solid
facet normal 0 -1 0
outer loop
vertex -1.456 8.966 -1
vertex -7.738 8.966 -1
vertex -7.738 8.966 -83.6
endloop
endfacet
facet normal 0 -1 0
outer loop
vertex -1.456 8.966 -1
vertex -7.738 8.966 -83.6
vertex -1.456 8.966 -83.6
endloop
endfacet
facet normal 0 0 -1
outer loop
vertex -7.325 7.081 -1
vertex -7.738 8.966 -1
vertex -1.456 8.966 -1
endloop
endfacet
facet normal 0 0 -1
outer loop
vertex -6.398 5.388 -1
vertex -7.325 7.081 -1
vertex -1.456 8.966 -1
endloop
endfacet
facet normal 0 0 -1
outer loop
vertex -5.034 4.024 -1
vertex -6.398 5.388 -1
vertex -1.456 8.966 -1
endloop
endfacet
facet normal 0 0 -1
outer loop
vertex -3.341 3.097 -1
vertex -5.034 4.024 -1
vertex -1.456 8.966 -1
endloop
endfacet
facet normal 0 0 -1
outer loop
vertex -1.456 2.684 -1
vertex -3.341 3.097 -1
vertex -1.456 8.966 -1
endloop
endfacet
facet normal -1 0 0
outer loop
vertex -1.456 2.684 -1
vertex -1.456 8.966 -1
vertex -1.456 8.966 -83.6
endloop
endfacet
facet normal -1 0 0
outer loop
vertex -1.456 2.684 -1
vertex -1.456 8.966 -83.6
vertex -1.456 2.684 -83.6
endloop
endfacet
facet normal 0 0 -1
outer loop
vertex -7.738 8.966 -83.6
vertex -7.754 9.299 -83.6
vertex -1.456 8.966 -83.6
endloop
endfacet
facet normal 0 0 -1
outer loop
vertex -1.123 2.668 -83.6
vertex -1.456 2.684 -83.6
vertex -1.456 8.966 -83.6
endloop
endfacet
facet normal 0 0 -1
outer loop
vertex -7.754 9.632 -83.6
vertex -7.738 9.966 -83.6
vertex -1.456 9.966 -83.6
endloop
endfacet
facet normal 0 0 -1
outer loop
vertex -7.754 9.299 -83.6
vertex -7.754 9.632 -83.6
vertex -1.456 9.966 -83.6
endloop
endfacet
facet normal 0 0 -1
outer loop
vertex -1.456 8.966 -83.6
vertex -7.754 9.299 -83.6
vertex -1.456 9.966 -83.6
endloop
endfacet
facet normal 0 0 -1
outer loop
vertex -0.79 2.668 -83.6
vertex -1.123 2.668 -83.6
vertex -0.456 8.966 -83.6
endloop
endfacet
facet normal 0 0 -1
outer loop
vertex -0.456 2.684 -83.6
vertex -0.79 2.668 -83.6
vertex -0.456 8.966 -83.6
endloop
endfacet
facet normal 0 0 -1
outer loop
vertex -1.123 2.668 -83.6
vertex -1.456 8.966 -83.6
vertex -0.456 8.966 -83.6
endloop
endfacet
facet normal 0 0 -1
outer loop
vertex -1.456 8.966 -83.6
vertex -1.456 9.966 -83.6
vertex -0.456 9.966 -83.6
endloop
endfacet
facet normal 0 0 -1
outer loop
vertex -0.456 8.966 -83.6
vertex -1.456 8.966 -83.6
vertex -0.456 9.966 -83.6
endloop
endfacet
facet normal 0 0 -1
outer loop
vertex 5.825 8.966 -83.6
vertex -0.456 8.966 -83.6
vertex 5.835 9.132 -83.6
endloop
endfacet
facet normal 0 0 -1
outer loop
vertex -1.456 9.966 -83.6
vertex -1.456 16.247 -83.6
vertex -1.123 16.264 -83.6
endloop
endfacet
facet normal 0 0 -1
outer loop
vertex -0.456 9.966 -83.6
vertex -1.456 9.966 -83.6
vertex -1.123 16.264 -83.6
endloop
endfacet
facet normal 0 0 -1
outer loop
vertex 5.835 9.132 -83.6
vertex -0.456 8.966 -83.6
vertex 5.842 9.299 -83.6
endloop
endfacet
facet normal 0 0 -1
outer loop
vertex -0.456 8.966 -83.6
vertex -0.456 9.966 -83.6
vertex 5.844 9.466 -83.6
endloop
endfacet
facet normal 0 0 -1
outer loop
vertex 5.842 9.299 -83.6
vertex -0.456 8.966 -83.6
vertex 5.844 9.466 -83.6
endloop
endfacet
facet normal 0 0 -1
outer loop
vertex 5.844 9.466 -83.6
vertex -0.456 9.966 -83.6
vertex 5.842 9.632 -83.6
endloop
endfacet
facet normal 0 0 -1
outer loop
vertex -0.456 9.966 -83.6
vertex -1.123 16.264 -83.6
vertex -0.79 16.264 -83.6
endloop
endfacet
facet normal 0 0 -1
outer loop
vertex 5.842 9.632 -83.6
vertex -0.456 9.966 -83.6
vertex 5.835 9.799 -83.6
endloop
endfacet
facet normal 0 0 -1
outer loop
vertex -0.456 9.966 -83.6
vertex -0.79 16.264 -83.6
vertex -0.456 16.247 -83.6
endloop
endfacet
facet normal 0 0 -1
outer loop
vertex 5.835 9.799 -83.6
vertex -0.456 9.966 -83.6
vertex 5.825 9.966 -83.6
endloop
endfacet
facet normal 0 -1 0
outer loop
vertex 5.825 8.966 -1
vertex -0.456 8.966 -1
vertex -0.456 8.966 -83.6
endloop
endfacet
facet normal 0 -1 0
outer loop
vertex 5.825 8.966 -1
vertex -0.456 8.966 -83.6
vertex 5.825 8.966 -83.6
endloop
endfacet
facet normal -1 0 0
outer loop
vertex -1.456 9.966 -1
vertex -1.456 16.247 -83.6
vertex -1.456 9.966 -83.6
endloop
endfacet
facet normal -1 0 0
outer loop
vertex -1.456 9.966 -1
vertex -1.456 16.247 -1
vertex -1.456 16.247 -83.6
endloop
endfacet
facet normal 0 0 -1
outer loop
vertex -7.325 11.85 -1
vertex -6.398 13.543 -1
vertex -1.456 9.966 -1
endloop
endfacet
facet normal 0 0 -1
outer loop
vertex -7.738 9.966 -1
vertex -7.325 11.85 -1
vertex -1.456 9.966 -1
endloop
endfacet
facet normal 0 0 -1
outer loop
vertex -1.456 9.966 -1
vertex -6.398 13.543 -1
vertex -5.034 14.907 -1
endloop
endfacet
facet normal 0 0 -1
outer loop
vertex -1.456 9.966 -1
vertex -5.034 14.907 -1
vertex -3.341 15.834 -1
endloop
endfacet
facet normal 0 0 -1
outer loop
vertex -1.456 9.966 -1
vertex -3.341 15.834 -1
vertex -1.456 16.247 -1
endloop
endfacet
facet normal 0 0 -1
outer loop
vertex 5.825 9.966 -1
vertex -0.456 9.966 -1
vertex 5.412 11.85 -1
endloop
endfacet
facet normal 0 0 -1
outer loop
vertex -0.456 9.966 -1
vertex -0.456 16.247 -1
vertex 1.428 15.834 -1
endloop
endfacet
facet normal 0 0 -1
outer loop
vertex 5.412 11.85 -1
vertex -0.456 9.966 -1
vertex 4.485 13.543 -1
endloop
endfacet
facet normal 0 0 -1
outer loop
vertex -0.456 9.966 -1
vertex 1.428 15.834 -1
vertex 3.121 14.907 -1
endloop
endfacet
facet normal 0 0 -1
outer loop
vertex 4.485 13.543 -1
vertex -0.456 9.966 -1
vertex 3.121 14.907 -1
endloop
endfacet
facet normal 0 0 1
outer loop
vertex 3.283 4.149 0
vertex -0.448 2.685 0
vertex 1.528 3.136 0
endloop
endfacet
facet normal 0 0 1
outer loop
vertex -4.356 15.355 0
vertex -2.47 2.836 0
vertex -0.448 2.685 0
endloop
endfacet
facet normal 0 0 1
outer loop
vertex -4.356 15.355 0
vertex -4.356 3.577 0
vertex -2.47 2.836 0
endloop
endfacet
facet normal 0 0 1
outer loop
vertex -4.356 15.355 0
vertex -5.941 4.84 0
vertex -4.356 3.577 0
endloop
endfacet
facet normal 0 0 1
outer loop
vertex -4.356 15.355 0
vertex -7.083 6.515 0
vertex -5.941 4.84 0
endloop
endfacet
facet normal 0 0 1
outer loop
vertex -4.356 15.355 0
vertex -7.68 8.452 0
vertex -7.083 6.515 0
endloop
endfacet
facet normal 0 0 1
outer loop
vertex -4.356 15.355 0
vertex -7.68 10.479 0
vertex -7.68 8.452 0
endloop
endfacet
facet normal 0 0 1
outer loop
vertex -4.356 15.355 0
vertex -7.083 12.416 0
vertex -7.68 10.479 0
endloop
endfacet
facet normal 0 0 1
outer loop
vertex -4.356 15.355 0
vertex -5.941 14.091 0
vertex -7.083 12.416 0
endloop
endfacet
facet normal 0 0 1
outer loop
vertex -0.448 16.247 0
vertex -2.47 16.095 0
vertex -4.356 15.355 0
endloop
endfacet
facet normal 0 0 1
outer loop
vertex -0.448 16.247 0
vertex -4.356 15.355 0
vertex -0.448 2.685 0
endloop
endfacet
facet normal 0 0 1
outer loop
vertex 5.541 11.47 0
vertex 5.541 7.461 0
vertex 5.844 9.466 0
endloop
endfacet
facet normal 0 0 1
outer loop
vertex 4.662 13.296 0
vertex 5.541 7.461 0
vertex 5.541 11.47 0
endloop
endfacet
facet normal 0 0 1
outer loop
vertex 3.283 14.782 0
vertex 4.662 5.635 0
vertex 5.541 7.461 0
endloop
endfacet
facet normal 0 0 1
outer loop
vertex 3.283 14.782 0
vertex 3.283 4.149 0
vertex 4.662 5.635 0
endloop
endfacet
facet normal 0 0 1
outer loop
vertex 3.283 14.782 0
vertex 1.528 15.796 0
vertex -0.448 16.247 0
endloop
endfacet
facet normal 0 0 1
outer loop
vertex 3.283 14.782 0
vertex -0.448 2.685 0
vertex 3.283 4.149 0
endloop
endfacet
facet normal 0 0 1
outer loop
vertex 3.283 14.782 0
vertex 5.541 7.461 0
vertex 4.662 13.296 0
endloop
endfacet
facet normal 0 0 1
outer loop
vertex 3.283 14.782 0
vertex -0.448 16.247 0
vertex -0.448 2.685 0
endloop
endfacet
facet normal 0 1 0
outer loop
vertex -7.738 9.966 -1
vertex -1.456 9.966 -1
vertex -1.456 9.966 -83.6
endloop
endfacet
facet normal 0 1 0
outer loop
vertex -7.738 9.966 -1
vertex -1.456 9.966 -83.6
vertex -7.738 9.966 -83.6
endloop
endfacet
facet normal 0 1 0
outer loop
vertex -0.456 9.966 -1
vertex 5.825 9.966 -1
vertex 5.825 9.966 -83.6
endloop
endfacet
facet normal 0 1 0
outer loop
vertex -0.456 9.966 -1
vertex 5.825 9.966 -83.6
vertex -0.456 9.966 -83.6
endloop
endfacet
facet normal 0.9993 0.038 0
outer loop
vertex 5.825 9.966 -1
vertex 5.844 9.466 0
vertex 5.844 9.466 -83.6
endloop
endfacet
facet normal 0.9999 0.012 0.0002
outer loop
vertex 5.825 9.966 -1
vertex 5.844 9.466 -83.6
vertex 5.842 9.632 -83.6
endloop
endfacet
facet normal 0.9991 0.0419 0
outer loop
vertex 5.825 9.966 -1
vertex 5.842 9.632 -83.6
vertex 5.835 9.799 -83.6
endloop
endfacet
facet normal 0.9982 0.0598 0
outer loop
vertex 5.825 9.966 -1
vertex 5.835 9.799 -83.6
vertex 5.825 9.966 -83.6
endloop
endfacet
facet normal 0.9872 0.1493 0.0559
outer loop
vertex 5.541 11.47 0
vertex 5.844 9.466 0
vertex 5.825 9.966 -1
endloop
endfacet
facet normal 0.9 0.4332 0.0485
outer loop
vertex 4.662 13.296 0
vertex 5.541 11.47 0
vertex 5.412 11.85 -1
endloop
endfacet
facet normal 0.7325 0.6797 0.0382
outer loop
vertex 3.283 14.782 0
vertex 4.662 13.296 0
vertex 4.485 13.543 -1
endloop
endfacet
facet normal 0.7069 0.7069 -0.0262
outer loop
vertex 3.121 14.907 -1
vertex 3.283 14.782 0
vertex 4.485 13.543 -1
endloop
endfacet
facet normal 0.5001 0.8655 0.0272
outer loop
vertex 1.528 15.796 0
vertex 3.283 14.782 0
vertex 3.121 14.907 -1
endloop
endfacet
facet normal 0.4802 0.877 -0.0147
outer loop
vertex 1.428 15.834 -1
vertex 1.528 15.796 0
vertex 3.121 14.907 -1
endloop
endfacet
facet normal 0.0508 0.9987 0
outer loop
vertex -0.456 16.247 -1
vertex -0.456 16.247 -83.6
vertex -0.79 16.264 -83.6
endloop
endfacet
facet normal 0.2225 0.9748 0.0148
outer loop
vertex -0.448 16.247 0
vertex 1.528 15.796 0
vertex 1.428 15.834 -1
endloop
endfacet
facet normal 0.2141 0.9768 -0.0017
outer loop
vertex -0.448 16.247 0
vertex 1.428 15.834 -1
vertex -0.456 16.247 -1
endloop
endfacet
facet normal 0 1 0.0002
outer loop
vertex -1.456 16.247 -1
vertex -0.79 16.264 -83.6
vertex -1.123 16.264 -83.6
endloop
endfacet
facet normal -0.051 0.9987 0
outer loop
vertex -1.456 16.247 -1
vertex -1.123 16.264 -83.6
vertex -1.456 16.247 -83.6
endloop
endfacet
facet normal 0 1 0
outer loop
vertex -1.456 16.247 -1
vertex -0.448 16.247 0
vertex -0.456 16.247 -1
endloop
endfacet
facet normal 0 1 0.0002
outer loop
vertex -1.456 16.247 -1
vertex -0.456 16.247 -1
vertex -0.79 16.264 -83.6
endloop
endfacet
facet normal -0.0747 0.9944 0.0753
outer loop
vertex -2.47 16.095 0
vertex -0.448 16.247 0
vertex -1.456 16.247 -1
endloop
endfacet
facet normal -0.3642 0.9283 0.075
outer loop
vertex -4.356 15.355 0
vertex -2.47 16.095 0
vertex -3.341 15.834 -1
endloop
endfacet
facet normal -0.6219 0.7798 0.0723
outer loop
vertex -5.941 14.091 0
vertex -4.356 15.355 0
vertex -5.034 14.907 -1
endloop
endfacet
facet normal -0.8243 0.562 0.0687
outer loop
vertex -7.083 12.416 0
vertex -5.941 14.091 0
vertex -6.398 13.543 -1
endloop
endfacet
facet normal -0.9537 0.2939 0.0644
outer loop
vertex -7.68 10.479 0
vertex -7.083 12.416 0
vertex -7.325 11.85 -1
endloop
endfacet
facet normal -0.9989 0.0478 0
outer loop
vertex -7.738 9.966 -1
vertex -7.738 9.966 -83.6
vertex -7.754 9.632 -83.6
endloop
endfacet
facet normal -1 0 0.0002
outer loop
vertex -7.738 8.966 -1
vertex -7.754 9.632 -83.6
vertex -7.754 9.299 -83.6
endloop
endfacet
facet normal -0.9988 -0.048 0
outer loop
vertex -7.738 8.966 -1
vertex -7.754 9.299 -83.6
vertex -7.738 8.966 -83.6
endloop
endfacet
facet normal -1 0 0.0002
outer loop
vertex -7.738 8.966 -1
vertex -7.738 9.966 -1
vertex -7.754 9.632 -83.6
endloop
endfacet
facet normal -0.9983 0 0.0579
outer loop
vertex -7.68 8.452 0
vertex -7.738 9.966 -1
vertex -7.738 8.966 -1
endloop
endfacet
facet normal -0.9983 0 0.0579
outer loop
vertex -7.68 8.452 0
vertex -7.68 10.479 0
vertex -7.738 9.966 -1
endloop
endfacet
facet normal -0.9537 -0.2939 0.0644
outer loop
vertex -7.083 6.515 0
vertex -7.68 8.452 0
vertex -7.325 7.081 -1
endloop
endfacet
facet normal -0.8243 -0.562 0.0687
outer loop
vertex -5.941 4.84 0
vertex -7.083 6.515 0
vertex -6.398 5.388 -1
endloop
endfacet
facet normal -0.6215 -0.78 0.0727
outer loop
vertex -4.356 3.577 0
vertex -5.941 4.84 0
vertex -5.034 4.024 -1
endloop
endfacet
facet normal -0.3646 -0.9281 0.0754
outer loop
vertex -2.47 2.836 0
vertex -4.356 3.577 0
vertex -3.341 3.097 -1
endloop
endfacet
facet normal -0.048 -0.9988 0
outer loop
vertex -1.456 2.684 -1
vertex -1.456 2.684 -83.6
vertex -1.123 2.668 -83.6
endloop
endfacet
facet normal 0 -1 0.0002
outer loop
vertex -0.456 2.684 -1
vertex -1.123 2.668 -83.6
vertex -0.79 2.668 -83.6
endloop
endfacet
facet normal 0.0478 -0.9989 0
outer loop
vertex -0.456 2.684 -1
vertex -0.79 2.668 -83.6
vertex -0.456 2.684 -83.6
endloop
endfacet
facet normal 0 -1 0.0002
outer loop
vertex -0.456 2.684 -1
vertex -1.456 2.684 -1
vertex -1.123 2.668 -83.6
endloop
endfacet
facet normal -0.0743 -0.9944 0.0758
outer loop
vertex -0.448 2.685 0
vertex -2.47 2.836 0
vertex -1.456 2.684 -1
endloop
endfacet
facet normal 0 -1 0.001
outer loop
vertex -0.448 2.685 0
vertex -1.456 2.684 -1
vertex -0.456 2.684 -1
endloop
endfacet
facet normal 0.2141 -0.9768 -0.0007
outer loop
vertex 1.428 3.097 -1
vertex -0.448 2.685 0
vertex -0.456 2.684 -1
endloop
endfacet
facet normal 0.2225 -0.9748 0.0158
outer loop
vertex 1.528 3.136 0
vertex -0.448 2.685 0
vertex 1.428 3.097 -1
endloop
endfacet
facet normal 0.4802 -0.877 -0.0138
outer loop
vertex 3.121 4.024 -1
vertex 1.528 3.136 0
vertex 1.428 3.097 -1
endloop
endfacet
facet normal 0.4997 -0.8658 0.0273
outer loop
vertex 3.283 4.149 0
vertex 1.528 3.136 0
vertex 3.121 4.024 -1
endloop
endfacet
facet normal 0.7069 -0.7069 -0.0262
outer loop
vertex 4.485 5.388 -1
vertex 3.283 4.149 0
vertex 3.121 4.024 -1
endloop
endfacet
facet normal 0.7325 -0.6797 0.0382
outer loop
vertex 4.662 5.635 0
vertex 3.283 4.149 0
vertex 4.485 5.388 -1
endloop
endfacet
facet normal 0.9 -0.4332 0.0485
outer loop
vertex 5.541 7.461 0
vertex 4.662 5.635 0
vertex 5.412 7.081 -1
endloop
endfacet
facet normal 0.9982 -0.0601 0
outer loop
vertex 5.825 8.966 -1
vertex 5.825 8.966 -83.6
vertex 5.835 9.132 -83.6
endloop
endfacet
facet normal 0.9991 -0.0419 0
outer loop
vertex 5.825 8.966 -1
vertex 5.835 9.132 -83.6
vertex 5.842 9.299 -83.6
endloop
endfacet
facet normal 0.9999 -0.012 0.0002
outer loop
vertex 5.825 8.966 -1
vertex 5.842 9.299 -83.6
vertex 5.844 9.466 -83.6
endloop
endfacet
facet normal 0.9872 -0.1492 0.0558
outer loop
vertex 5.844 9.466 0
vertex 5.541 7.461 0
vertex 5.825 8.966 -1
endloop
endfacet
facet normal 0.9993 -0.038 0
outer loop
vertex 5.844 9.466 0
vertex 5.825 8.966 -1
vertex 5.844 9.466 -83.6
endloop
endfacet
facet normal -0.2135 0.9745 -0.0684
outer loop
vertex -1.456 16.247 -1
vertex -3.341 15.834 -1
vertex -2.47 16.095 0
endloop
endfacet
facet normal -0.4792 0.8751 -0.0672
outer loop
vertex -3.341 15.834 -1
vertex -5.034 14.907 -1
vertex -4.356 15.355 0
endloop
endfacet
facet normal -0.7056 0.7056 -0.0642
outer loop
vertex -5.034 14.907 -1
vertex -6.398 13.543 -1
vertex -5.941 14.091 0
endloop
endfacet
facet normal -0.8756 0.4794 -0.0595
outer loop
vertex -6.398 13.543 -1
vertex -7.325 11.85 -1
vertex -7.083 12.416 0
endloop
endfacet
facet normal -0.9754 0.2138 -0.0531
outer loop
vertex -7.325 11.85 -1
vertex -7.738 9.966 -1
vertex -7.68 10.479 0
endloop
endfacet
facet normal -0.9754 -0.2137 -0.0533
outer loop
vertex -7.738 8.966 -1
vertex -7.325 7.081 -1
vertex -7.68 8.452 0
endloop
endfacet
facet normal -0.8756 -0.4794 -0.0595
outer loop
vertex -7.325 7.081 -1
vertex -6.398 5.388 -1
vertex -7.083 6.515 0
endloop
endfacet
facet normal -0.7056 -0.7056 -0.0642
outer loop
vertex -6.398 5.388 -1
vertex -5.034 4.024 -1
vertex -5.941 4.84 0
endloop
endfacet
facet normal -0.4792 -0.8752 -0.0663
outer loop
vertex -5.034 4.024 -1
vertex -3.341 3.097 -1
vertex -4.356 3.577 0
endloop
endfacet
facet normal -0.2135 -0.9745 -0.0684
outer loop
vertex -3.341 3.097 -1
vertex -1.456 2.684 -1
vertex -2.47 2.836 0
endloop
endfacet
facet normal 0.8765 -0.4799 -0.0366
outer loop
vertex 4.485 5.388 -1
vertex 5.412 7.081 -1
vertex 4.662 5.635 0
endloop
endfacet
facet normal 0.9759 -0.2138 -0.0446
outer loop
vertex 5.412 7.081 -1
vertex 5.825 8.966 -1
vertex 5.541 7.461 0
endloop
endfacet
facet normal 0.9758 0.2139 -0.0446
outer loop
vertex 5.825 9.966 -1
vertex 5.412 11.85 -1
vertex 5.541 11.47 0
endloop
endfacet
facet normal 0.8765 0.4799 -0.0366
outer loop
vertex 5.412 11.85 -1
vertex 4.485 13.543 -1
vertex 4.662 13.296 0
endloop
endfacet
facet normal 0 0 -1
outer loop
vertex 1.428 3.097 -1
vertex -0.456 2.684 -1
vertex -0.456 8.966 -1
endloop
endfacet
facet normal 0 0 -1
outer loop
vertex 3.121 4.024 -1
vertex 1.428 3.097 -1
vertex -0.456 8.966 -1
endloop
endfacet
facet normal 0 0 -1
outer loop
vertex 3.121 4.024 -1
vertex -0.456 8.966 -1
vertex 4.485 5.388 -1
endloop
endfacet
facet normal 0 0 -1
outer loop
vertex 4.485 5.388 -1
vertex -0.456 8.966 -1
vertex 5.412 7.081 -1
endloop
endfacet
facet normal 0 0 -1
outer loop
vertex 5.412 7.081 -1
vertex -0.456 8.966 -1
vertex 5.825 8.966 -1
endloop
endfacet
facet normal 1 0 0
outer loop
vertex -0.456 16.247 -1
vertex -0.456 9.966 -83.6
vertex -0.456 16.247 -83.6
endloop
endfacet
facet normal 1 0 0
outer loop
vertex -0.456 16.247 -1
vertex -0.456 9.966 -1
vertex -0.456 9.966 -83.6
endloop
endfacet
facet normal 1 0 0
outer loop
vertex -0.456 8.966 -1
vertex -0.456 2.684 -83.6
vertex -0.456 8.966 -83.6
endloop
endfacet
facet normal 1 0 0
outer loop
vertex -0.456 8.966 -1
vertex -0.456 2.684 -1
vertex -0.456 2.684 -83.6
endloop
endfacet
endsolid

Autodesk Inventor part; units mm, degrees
ref_plane "YZ Plane" through (0, 0, 0) normal (1, 0, 0) x (0, 1, 0)
ref_plane "XZ Plane" through (0, 0, 0) normal (0, 1, 0) x (-1, 0, 0)
ref_plane "XY Plane" through (0, 0, 0) normal (0, 0, 1) x (1, 0, 0)
sketch "Sketch1" plane through (0, 0, 0) normal (0, 0, 1) x (1, 0, 0)
  line L0 (-1.4564, 16.2472) -> (-1.4564, 9.9656)
  line L1 (-1.4564, 9.9656) -> (-7.738, 9.9656)
  line L2 (-7.738, 8.9656) -> (-1.4564, 8.9656)
  line L3 (-1.4564, 8.9656) -> (-1.4564, 2.684)
  line L4 (-0.4564, 2.684) -> (-0.4564, 8.9656)
  line L5 (-0.4564, 8.9656) -> (5.8252, 8.9656)
  line L6 (5.8252, 9.9656) -> (-0.4564, 9.9656)
  line L7 (-0.4564, 9.9656) -> (-0.4564, 16.2472)
  circle A0 centre (-0.9564, 9.4656) radius 6.8
extrude "Extrusion1" add sketch "Sketch1" against normal blind 83.6 contours A0 L7 L6 L5 L4 L3 L2 L1 L0
extrude "Extrusion2" add sketch "Sketch1" against normal blind 1 contours L0 L1 A0 | A0 L6 L7 | L2 L3 A0 | A0 L4 L5
properties part number "seringa inside"
